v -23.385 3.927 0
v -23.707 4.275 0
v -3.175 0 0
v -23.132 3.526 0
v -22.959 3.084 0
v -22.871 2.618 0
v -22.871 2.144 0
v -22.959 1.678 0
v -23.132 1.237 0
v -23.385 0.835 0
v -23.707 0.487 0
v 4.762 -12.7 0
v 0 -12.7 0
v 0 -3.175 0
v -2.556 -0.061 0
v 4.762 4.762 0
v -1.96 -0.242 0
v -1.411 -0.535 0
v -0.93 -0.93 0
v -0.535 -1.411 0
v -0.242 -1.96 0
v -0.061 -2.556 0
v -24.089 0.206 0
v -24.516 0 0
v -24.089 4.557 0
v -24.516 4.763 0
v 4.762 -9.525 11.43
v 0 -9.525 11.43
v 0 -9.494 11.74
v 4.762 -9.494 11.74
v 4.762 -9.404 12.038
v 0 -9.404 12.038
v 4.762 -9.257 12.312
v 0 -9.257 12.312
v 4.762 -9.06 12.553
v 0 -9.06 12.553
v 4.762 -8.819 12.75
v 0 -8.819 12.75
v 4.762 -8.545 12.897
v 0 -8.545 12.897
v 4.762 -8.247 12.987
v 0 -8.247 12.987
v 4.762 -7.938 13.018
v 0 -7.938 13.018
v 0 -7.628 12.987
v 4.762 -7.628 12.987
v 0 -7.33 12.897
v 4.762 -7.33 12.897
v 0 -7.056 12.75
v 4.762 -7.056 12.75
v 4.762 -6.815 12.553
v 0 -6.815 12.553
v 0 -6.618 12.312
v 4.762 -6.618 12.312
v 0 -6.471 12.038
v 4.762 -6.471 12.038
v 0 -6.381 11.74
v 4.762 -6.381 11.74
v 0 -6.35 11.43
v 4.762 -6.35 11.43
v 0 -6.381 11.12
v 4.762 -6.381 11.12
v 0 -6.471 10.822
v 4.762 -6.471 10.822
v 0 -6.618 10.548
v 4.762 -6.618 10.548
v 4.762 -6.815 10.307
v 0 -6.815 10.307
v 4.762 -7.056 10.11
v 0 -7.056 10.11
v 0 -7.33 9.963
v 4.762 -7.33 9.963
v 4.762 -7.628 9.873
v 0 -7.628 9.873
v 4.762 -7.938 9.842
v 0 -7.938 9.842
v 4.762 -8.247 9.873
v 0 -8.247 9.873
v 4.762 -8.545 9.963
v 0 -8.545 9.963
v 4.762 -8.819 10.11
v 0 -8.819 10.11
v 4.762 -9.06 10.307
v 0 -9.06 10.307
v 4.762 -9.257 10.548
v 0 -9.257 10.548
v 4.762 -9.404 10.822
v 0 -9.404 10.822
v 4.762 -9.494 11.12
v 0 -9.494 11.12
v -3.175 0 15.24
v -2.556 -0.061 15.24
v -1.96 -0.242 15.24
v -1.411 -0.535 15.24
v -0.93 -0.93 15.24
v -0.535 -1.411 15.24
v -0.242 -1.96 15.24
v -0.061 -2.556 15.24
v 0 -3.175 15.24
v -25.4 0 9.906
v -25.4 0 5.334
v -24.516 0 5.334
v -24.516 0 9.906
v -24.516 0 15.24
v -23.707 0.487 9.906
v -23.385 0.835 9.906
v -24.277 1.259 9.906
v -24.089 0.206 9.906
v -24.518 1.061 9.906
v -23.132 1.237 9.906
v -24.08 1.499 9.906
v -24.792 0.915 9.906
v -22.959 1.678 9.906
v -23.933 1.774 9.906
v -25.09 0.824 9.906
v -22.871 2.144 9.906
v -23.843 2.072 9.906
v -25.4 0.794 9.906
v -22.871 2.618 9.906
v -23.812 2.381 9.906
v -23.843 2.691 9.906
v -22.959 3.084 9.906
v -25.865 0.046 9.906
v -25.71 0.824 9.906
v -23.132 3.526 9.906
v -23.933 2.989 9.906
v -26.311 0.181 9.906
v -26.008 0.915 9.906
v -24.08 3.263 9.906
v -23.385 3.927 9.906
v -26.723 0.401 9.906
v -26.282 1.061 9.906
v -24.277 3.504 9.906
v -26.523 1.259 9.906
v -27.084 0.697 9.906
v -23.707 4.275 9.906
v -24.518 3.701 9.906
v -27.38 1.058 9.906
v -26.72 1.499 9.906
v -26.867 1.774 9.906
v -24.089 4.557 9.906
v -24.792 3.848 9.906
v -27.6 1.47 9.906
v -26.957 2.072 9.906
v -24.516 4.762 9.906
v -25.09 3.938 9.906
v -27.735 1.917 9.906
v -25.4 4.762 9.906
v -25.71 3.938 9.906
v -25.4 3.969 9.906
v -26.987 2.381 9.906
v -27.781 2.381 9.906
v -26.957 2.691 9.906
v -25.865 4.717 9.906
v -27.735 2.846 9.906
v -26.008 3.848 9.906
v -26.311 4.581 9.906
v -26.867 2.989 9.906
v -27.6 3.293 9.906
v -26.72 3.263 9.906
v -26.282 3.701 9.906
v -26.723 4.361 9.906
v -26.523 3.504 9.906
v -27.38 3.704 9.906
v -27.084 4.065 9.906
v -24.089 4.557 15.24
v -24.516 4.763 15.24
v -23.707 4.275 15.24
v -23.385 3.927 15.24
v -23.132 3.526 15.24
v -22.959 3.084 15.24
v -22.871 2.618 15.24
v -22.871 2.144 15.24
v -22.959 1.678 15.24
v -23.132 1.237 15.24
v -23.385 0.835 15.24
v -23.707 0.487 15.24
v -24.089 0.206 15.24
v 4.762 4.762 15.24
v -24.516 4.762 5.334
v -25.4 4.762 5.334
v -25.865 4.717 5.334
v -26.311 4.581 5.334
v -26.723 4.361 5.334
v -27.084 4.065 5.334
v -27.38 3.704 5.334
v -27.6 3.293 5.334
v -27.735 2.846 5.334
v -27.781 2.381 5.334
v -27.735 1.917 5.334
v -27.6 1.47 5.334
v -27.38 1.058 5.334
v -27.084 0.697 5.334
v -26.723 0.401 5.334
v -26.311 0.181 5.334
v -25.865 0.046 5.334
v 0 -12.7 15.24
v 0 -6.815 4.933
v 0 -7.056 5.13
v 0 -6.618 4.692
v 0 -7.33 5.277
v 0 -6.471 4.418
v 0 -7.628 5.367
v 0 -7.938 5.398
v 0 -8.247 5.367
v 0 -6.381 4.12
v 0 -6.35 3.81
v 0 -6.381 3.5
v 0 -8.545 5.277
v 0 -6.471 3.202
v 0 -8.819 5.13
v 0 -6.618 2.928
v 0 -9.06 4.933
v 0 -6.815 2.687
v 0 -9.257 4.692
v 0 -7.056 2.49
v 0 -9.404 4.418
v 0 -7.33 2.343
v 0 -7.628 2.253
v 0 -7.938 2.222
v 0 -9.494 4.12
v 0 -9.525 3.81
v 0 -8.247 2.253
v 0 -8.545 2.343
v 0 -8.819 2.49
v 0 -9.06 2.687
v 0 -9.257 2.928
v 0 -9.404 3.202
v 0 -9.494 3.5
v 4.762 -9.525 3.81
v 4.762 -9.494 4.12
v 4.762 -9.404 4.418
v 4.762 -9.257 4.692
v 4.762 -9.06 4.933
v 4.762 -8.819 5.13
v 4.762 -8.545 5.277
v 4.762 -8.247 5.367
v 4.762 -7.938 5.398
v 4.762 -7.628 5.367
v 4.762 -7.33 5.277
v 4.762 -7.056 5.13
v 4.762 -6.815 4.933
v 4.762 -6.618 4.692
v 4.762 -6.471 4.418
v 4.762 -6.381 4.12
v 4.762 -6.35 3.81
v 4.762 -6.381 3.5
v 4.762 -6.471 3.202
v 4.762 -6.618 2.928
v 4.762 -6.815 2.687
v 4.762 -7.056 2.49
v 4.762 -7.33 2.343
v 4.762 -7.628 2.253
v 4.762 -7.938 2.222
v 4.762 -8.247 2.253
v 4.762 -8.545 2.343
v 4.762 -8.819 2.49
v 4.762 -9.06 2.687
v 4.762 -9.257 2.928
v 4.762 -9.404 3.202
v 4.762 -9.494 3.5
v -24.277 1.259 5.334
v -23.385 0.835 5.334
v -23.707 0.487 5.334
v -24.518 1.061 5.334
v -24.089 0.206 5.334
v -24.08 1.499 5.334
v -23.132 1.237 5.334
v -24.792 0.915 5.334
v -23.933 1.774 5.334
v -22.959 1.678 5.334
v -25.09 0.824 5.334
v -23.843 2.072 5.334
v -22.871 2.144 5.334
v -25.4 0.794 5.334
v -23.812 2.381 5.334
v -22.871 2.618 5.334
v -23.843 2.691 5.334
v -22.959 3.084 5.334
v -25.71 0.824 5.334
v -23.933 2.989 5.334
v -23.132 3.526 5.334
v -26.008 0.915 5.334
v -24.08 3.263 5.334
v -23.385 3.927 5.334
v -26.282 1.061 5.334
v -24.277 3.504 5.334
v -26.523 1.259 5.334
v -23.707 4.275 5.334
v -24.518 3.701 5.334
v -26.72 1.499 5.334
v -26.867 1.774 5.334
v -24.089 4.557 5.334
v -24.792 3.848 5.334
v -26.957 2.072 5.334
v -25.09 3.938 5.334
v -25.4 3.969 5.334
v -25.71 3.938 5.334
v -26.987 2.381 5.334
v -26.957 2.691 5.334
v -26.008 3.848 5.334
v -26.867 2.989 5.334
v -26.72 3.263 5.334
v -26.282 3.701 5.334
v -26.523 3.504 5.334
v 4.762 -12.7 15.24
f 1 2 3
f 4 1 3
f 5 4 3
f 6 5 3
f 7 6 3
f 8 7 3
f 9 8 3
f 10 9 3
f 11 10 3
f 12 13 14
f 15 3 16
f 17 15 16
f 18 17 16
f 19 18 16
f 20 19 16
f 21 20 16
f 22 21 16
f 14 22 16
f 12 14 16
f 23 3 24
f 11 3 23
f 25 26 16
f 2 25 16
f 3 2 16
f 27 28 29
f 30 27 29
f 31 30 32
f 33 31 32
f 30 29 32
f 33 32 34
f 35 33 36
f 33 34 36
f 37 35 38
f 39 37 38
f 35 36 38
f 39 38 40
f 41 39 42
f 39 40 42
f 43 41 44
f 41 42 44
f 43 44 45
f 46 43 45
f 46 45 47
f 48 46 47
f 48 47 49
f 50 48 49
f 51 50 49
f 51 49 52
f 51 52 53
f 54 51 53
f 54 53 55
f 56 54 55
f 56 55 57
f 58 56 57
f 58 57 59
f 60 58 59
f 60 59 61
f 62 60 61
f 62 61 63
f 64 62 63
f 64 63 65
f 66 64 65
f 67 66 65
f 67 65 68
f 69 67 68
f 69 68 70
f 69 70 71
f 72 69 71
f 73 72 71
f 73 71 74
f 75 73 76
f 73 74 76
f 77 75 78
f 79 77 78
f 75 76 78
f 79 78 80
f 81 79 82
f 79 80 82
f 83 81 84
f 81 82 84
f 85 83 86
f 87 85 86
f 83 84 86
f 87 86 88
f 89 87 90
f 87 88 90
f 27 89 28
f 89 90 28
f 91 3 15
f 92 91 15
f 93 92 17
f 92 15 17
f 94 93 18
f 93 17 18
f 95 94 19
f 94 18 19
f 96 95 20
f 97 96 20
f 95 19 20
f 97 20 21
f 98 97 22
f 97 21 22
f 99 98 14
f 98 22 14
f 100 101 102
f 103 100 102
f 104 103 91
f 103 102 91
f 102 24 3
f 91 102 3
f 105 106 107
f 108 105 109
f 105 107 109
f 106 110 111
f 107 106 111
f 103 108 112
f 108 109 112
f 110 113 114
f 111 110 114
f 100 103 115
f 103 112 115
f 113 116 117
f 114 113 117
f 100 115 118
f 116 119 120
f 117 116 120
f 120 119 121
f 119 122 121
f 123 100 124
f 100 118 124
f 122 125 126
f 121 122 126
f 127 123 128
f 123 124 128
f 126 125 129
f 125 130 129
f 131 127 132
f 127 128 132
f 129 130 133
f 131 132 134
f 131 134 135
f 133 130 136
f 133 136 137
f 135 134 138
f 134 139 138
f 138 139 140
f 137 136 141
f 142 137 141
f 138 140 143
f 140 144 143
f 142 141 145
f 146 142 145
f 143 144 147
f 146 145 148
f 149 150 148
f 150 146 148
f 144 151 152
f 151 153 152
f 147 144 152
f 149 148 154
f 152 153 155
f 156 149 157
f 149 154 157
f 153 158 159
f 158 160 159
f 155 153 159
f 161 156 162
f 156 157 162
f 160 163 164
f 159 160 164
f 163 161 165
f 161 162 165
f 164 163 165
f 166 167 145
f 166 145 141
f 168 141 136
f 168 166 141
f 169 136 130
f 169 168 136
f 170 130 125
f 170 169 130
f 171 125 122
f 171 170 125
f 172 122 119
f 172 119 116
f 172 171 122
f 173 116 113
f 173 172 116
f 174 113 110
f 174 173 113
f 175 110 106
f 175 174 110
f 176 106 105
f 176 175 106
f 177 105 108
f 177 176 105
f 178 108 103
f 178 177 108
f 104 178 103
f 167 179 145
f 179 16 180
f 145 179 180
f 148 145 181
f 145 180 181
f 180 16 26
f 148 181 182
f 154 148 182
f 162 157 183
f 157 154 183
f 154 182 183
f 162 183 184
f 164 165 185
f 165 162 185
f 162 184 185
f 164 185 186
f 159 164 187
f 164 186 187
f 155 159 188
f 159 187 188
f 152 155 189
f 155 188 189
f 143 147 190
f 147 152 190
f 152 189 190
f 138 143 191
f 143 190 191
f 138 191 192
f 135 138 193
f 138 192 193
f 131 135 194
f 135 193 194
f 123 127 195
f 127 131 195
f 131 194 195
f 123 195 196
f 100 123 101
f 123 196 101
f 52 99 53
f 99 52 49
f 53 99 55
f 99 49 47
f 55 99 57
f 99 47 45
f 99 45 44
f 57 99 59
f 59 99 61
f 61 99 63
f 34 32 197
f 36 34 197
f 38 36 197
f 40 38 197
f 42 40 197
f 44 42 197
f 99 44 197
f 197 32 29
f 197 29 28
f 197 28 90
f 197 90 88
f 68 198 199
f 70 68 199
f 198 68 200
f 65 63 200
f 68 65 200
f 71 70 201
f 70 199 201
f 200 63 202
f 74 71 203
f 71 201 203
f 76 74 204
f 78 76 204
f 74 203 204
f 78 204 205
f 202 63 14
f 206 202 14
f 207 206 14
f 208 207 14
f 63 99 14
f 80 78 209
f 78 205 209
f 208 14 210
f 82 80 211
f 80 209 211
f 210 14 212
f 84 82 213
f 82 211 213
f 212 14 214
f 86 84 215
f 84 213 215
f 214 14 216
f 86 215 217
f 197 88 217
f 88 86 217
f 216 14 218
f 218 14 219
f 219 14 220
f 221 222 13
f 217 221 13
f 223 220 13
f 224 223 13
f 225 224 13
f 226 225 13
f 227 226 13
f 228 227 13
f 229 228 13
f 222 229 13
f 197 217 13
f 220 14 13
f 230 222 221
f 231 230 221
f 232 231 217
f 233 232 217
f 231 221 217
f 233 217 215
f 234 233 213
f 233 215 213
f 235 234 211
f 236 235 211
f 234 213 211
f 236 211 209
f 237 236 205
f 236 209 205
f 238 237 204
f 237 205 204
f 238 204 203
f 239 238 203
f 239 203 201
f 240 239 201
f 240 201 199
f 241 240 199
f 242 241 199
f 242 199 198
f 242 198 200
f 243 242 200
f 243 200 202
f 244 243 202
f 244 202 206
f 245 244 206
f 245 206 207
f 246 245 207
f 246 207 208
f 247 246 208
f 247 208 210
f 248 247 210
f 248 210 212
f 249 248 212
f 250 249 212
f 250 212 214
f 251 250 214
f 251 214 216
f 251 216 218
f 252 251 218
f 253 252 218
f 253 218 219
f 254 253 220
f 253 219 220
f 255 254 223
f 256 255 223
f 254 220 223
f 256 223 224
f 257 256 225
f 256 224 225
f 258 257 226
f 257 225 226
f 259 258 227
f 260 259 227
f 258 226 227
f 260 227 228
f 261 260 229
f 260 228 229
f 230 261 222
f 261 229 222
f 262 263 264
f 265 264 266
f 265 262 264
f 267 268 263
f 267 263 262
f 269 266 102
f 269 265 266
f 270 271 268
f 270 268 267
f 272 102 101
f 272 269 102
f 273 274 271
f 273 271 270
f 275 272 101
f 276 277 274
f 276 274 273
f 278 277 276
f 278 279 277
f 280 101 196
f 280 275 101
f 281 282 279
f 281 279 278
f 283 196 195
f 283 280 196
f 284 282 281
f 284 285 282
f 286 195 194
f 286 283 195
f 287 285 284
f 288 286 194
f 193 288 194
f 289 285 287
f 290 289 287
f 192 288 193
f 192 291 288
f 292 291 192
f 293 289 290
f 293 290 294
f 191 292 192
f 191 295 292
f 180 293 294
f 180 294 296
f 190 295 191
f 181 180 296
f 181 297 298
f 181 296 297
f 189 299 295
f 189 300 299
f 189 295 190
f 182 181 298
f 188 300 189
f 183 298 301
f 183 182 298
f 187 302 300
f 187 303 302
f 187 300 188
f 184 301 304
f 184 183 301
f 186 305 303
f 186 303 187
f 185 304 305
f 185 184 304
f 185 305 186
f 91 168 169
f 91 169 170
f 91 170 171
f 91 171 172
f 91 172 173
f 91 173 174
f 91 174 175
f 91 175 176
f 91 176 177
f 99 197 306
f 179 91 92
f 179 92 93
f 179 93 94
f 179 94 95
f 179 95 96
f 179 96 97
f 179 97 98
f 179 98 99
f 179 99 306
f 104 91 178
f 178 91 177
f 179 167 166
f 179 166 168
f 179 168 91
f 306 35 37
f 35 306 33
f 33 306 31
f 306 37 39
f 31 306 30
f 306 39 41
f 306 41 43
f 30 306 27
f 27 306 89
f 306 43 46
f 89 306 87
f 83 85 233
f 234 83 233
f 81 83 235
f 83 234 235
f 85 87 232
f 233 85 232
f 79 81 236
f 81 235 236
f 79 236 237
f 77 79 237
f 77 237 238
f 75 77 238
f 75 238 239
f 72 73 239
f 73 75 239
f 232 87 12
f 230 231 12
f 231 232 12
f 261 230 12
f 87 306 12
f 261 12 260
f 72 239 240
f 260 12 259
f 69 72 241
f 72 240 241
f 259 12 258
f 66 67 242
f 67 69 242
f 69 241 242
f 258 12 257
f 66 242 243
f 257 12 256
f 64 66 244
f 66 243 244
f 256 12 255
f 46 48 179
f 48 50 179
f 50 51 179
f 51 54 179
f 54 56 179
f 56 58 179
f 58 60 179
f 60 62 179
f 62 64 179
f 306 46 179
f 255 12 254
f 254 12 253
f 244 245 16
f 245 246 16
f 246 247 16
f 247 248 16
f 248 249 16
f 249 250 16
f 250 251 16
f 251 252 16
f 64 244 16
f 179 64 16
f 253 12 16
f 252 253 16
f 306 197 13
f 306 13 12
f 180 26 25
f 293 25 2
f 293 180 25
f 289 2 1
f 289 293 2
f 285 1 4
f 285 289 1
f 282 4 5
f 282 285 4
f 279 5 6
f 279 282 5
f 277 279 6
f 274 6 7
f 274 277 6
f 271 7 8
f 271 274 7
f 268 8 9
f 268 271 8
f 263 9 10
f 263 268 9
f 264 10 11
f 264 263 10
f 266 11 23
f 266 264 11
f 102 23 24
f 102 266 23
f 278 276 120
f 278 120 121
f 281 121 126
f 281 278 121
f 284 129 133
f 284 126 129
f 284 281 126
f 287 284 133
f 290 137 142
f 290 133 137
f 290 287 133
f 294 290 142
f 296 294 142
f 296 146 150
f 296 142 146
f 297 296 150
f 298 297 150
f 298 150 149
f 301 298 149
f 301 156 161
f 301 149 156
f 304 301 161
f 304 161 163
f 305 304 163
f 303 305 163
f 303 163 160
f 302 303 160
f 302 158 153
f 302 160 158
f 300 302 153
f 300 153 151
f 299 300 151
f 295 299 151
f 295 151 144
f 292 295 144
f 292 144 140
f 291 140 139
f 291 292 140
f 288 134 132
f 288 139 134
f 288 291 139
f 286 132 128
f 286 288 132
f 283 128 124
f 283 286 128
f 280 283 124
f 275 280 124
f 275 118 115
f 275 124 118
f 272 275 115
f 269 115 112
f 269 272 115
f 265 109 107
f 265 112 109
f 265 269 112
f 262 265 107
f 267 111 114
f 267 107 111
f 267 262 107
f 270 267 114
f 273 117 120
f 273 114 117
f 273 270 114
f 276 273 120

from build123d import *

# Parameters (mm, degrees)
F0_R     = 1.5875
F1_DEPTH = 15.24
F3_W     = 2.54
F3_H     = 5.334
F5_R     = 1.5875
F6_DEPTH = 4.7635


with BuildPart() as f1:
    # F0 (on Top) → F1 (new body)
    with BuildSketch(Plane.XY):
        with BuildLine():
            ThreePointArc((-3.175, 0), (-0.929936, -0.929936), (0, -3.175))
            Line((0, -3.175), (0, -12.7))
            Line((0, -12.7), (4.7625, -12.7))
            Line((4.7625, -12.7), (4.7625, 4.7625))
            Line((4.7625, 4.7625), (-25.4, 4.7625))
            ThreePointArc((-25.4, 4.7625), (-27.78125, 2.38125), (-25.4, 0))
            Line((-25.4, 0), (-3.175, 0))
        make_face()
        with Locations((-25.4, 2.38125)):
            Circle(F0_R, mode=Mode.SUBTRACT)
    extrude(amount=F1_DEPTH)

    # F3 (on offset) → F4 (revolve, cut)
    with BuildSketch(Plane.XZ.offset(-2.38125)):
        with Locations((-26.67, 12.573)):
            Rectangle(F3_W, F3_H)
        with Locations((-26.67, 2.667)):
            Rectangle(F3_W, F3_H)
    revolve(axis=Axis((-25.4, 2.38125, 12.573), (0, 0, -1)), mode=Mode.SUBTRACT)

    # F5 (on face) → F6 (cut, through all)
    with BuildSketch(Plane(origin=(0, 0, 0), x_dir=(0, -1, 0), z_dir=(-1, 0, 0))):
        with Locations((7.9375, 11.43)):
            Circle(F5_R)
        with Locations((7.9375, 3.81)):
            Circle(F5_R)
    extrude(amount=-F6_DEPTH, mode=Mode.SUBTRACT)


solid = f1.part
